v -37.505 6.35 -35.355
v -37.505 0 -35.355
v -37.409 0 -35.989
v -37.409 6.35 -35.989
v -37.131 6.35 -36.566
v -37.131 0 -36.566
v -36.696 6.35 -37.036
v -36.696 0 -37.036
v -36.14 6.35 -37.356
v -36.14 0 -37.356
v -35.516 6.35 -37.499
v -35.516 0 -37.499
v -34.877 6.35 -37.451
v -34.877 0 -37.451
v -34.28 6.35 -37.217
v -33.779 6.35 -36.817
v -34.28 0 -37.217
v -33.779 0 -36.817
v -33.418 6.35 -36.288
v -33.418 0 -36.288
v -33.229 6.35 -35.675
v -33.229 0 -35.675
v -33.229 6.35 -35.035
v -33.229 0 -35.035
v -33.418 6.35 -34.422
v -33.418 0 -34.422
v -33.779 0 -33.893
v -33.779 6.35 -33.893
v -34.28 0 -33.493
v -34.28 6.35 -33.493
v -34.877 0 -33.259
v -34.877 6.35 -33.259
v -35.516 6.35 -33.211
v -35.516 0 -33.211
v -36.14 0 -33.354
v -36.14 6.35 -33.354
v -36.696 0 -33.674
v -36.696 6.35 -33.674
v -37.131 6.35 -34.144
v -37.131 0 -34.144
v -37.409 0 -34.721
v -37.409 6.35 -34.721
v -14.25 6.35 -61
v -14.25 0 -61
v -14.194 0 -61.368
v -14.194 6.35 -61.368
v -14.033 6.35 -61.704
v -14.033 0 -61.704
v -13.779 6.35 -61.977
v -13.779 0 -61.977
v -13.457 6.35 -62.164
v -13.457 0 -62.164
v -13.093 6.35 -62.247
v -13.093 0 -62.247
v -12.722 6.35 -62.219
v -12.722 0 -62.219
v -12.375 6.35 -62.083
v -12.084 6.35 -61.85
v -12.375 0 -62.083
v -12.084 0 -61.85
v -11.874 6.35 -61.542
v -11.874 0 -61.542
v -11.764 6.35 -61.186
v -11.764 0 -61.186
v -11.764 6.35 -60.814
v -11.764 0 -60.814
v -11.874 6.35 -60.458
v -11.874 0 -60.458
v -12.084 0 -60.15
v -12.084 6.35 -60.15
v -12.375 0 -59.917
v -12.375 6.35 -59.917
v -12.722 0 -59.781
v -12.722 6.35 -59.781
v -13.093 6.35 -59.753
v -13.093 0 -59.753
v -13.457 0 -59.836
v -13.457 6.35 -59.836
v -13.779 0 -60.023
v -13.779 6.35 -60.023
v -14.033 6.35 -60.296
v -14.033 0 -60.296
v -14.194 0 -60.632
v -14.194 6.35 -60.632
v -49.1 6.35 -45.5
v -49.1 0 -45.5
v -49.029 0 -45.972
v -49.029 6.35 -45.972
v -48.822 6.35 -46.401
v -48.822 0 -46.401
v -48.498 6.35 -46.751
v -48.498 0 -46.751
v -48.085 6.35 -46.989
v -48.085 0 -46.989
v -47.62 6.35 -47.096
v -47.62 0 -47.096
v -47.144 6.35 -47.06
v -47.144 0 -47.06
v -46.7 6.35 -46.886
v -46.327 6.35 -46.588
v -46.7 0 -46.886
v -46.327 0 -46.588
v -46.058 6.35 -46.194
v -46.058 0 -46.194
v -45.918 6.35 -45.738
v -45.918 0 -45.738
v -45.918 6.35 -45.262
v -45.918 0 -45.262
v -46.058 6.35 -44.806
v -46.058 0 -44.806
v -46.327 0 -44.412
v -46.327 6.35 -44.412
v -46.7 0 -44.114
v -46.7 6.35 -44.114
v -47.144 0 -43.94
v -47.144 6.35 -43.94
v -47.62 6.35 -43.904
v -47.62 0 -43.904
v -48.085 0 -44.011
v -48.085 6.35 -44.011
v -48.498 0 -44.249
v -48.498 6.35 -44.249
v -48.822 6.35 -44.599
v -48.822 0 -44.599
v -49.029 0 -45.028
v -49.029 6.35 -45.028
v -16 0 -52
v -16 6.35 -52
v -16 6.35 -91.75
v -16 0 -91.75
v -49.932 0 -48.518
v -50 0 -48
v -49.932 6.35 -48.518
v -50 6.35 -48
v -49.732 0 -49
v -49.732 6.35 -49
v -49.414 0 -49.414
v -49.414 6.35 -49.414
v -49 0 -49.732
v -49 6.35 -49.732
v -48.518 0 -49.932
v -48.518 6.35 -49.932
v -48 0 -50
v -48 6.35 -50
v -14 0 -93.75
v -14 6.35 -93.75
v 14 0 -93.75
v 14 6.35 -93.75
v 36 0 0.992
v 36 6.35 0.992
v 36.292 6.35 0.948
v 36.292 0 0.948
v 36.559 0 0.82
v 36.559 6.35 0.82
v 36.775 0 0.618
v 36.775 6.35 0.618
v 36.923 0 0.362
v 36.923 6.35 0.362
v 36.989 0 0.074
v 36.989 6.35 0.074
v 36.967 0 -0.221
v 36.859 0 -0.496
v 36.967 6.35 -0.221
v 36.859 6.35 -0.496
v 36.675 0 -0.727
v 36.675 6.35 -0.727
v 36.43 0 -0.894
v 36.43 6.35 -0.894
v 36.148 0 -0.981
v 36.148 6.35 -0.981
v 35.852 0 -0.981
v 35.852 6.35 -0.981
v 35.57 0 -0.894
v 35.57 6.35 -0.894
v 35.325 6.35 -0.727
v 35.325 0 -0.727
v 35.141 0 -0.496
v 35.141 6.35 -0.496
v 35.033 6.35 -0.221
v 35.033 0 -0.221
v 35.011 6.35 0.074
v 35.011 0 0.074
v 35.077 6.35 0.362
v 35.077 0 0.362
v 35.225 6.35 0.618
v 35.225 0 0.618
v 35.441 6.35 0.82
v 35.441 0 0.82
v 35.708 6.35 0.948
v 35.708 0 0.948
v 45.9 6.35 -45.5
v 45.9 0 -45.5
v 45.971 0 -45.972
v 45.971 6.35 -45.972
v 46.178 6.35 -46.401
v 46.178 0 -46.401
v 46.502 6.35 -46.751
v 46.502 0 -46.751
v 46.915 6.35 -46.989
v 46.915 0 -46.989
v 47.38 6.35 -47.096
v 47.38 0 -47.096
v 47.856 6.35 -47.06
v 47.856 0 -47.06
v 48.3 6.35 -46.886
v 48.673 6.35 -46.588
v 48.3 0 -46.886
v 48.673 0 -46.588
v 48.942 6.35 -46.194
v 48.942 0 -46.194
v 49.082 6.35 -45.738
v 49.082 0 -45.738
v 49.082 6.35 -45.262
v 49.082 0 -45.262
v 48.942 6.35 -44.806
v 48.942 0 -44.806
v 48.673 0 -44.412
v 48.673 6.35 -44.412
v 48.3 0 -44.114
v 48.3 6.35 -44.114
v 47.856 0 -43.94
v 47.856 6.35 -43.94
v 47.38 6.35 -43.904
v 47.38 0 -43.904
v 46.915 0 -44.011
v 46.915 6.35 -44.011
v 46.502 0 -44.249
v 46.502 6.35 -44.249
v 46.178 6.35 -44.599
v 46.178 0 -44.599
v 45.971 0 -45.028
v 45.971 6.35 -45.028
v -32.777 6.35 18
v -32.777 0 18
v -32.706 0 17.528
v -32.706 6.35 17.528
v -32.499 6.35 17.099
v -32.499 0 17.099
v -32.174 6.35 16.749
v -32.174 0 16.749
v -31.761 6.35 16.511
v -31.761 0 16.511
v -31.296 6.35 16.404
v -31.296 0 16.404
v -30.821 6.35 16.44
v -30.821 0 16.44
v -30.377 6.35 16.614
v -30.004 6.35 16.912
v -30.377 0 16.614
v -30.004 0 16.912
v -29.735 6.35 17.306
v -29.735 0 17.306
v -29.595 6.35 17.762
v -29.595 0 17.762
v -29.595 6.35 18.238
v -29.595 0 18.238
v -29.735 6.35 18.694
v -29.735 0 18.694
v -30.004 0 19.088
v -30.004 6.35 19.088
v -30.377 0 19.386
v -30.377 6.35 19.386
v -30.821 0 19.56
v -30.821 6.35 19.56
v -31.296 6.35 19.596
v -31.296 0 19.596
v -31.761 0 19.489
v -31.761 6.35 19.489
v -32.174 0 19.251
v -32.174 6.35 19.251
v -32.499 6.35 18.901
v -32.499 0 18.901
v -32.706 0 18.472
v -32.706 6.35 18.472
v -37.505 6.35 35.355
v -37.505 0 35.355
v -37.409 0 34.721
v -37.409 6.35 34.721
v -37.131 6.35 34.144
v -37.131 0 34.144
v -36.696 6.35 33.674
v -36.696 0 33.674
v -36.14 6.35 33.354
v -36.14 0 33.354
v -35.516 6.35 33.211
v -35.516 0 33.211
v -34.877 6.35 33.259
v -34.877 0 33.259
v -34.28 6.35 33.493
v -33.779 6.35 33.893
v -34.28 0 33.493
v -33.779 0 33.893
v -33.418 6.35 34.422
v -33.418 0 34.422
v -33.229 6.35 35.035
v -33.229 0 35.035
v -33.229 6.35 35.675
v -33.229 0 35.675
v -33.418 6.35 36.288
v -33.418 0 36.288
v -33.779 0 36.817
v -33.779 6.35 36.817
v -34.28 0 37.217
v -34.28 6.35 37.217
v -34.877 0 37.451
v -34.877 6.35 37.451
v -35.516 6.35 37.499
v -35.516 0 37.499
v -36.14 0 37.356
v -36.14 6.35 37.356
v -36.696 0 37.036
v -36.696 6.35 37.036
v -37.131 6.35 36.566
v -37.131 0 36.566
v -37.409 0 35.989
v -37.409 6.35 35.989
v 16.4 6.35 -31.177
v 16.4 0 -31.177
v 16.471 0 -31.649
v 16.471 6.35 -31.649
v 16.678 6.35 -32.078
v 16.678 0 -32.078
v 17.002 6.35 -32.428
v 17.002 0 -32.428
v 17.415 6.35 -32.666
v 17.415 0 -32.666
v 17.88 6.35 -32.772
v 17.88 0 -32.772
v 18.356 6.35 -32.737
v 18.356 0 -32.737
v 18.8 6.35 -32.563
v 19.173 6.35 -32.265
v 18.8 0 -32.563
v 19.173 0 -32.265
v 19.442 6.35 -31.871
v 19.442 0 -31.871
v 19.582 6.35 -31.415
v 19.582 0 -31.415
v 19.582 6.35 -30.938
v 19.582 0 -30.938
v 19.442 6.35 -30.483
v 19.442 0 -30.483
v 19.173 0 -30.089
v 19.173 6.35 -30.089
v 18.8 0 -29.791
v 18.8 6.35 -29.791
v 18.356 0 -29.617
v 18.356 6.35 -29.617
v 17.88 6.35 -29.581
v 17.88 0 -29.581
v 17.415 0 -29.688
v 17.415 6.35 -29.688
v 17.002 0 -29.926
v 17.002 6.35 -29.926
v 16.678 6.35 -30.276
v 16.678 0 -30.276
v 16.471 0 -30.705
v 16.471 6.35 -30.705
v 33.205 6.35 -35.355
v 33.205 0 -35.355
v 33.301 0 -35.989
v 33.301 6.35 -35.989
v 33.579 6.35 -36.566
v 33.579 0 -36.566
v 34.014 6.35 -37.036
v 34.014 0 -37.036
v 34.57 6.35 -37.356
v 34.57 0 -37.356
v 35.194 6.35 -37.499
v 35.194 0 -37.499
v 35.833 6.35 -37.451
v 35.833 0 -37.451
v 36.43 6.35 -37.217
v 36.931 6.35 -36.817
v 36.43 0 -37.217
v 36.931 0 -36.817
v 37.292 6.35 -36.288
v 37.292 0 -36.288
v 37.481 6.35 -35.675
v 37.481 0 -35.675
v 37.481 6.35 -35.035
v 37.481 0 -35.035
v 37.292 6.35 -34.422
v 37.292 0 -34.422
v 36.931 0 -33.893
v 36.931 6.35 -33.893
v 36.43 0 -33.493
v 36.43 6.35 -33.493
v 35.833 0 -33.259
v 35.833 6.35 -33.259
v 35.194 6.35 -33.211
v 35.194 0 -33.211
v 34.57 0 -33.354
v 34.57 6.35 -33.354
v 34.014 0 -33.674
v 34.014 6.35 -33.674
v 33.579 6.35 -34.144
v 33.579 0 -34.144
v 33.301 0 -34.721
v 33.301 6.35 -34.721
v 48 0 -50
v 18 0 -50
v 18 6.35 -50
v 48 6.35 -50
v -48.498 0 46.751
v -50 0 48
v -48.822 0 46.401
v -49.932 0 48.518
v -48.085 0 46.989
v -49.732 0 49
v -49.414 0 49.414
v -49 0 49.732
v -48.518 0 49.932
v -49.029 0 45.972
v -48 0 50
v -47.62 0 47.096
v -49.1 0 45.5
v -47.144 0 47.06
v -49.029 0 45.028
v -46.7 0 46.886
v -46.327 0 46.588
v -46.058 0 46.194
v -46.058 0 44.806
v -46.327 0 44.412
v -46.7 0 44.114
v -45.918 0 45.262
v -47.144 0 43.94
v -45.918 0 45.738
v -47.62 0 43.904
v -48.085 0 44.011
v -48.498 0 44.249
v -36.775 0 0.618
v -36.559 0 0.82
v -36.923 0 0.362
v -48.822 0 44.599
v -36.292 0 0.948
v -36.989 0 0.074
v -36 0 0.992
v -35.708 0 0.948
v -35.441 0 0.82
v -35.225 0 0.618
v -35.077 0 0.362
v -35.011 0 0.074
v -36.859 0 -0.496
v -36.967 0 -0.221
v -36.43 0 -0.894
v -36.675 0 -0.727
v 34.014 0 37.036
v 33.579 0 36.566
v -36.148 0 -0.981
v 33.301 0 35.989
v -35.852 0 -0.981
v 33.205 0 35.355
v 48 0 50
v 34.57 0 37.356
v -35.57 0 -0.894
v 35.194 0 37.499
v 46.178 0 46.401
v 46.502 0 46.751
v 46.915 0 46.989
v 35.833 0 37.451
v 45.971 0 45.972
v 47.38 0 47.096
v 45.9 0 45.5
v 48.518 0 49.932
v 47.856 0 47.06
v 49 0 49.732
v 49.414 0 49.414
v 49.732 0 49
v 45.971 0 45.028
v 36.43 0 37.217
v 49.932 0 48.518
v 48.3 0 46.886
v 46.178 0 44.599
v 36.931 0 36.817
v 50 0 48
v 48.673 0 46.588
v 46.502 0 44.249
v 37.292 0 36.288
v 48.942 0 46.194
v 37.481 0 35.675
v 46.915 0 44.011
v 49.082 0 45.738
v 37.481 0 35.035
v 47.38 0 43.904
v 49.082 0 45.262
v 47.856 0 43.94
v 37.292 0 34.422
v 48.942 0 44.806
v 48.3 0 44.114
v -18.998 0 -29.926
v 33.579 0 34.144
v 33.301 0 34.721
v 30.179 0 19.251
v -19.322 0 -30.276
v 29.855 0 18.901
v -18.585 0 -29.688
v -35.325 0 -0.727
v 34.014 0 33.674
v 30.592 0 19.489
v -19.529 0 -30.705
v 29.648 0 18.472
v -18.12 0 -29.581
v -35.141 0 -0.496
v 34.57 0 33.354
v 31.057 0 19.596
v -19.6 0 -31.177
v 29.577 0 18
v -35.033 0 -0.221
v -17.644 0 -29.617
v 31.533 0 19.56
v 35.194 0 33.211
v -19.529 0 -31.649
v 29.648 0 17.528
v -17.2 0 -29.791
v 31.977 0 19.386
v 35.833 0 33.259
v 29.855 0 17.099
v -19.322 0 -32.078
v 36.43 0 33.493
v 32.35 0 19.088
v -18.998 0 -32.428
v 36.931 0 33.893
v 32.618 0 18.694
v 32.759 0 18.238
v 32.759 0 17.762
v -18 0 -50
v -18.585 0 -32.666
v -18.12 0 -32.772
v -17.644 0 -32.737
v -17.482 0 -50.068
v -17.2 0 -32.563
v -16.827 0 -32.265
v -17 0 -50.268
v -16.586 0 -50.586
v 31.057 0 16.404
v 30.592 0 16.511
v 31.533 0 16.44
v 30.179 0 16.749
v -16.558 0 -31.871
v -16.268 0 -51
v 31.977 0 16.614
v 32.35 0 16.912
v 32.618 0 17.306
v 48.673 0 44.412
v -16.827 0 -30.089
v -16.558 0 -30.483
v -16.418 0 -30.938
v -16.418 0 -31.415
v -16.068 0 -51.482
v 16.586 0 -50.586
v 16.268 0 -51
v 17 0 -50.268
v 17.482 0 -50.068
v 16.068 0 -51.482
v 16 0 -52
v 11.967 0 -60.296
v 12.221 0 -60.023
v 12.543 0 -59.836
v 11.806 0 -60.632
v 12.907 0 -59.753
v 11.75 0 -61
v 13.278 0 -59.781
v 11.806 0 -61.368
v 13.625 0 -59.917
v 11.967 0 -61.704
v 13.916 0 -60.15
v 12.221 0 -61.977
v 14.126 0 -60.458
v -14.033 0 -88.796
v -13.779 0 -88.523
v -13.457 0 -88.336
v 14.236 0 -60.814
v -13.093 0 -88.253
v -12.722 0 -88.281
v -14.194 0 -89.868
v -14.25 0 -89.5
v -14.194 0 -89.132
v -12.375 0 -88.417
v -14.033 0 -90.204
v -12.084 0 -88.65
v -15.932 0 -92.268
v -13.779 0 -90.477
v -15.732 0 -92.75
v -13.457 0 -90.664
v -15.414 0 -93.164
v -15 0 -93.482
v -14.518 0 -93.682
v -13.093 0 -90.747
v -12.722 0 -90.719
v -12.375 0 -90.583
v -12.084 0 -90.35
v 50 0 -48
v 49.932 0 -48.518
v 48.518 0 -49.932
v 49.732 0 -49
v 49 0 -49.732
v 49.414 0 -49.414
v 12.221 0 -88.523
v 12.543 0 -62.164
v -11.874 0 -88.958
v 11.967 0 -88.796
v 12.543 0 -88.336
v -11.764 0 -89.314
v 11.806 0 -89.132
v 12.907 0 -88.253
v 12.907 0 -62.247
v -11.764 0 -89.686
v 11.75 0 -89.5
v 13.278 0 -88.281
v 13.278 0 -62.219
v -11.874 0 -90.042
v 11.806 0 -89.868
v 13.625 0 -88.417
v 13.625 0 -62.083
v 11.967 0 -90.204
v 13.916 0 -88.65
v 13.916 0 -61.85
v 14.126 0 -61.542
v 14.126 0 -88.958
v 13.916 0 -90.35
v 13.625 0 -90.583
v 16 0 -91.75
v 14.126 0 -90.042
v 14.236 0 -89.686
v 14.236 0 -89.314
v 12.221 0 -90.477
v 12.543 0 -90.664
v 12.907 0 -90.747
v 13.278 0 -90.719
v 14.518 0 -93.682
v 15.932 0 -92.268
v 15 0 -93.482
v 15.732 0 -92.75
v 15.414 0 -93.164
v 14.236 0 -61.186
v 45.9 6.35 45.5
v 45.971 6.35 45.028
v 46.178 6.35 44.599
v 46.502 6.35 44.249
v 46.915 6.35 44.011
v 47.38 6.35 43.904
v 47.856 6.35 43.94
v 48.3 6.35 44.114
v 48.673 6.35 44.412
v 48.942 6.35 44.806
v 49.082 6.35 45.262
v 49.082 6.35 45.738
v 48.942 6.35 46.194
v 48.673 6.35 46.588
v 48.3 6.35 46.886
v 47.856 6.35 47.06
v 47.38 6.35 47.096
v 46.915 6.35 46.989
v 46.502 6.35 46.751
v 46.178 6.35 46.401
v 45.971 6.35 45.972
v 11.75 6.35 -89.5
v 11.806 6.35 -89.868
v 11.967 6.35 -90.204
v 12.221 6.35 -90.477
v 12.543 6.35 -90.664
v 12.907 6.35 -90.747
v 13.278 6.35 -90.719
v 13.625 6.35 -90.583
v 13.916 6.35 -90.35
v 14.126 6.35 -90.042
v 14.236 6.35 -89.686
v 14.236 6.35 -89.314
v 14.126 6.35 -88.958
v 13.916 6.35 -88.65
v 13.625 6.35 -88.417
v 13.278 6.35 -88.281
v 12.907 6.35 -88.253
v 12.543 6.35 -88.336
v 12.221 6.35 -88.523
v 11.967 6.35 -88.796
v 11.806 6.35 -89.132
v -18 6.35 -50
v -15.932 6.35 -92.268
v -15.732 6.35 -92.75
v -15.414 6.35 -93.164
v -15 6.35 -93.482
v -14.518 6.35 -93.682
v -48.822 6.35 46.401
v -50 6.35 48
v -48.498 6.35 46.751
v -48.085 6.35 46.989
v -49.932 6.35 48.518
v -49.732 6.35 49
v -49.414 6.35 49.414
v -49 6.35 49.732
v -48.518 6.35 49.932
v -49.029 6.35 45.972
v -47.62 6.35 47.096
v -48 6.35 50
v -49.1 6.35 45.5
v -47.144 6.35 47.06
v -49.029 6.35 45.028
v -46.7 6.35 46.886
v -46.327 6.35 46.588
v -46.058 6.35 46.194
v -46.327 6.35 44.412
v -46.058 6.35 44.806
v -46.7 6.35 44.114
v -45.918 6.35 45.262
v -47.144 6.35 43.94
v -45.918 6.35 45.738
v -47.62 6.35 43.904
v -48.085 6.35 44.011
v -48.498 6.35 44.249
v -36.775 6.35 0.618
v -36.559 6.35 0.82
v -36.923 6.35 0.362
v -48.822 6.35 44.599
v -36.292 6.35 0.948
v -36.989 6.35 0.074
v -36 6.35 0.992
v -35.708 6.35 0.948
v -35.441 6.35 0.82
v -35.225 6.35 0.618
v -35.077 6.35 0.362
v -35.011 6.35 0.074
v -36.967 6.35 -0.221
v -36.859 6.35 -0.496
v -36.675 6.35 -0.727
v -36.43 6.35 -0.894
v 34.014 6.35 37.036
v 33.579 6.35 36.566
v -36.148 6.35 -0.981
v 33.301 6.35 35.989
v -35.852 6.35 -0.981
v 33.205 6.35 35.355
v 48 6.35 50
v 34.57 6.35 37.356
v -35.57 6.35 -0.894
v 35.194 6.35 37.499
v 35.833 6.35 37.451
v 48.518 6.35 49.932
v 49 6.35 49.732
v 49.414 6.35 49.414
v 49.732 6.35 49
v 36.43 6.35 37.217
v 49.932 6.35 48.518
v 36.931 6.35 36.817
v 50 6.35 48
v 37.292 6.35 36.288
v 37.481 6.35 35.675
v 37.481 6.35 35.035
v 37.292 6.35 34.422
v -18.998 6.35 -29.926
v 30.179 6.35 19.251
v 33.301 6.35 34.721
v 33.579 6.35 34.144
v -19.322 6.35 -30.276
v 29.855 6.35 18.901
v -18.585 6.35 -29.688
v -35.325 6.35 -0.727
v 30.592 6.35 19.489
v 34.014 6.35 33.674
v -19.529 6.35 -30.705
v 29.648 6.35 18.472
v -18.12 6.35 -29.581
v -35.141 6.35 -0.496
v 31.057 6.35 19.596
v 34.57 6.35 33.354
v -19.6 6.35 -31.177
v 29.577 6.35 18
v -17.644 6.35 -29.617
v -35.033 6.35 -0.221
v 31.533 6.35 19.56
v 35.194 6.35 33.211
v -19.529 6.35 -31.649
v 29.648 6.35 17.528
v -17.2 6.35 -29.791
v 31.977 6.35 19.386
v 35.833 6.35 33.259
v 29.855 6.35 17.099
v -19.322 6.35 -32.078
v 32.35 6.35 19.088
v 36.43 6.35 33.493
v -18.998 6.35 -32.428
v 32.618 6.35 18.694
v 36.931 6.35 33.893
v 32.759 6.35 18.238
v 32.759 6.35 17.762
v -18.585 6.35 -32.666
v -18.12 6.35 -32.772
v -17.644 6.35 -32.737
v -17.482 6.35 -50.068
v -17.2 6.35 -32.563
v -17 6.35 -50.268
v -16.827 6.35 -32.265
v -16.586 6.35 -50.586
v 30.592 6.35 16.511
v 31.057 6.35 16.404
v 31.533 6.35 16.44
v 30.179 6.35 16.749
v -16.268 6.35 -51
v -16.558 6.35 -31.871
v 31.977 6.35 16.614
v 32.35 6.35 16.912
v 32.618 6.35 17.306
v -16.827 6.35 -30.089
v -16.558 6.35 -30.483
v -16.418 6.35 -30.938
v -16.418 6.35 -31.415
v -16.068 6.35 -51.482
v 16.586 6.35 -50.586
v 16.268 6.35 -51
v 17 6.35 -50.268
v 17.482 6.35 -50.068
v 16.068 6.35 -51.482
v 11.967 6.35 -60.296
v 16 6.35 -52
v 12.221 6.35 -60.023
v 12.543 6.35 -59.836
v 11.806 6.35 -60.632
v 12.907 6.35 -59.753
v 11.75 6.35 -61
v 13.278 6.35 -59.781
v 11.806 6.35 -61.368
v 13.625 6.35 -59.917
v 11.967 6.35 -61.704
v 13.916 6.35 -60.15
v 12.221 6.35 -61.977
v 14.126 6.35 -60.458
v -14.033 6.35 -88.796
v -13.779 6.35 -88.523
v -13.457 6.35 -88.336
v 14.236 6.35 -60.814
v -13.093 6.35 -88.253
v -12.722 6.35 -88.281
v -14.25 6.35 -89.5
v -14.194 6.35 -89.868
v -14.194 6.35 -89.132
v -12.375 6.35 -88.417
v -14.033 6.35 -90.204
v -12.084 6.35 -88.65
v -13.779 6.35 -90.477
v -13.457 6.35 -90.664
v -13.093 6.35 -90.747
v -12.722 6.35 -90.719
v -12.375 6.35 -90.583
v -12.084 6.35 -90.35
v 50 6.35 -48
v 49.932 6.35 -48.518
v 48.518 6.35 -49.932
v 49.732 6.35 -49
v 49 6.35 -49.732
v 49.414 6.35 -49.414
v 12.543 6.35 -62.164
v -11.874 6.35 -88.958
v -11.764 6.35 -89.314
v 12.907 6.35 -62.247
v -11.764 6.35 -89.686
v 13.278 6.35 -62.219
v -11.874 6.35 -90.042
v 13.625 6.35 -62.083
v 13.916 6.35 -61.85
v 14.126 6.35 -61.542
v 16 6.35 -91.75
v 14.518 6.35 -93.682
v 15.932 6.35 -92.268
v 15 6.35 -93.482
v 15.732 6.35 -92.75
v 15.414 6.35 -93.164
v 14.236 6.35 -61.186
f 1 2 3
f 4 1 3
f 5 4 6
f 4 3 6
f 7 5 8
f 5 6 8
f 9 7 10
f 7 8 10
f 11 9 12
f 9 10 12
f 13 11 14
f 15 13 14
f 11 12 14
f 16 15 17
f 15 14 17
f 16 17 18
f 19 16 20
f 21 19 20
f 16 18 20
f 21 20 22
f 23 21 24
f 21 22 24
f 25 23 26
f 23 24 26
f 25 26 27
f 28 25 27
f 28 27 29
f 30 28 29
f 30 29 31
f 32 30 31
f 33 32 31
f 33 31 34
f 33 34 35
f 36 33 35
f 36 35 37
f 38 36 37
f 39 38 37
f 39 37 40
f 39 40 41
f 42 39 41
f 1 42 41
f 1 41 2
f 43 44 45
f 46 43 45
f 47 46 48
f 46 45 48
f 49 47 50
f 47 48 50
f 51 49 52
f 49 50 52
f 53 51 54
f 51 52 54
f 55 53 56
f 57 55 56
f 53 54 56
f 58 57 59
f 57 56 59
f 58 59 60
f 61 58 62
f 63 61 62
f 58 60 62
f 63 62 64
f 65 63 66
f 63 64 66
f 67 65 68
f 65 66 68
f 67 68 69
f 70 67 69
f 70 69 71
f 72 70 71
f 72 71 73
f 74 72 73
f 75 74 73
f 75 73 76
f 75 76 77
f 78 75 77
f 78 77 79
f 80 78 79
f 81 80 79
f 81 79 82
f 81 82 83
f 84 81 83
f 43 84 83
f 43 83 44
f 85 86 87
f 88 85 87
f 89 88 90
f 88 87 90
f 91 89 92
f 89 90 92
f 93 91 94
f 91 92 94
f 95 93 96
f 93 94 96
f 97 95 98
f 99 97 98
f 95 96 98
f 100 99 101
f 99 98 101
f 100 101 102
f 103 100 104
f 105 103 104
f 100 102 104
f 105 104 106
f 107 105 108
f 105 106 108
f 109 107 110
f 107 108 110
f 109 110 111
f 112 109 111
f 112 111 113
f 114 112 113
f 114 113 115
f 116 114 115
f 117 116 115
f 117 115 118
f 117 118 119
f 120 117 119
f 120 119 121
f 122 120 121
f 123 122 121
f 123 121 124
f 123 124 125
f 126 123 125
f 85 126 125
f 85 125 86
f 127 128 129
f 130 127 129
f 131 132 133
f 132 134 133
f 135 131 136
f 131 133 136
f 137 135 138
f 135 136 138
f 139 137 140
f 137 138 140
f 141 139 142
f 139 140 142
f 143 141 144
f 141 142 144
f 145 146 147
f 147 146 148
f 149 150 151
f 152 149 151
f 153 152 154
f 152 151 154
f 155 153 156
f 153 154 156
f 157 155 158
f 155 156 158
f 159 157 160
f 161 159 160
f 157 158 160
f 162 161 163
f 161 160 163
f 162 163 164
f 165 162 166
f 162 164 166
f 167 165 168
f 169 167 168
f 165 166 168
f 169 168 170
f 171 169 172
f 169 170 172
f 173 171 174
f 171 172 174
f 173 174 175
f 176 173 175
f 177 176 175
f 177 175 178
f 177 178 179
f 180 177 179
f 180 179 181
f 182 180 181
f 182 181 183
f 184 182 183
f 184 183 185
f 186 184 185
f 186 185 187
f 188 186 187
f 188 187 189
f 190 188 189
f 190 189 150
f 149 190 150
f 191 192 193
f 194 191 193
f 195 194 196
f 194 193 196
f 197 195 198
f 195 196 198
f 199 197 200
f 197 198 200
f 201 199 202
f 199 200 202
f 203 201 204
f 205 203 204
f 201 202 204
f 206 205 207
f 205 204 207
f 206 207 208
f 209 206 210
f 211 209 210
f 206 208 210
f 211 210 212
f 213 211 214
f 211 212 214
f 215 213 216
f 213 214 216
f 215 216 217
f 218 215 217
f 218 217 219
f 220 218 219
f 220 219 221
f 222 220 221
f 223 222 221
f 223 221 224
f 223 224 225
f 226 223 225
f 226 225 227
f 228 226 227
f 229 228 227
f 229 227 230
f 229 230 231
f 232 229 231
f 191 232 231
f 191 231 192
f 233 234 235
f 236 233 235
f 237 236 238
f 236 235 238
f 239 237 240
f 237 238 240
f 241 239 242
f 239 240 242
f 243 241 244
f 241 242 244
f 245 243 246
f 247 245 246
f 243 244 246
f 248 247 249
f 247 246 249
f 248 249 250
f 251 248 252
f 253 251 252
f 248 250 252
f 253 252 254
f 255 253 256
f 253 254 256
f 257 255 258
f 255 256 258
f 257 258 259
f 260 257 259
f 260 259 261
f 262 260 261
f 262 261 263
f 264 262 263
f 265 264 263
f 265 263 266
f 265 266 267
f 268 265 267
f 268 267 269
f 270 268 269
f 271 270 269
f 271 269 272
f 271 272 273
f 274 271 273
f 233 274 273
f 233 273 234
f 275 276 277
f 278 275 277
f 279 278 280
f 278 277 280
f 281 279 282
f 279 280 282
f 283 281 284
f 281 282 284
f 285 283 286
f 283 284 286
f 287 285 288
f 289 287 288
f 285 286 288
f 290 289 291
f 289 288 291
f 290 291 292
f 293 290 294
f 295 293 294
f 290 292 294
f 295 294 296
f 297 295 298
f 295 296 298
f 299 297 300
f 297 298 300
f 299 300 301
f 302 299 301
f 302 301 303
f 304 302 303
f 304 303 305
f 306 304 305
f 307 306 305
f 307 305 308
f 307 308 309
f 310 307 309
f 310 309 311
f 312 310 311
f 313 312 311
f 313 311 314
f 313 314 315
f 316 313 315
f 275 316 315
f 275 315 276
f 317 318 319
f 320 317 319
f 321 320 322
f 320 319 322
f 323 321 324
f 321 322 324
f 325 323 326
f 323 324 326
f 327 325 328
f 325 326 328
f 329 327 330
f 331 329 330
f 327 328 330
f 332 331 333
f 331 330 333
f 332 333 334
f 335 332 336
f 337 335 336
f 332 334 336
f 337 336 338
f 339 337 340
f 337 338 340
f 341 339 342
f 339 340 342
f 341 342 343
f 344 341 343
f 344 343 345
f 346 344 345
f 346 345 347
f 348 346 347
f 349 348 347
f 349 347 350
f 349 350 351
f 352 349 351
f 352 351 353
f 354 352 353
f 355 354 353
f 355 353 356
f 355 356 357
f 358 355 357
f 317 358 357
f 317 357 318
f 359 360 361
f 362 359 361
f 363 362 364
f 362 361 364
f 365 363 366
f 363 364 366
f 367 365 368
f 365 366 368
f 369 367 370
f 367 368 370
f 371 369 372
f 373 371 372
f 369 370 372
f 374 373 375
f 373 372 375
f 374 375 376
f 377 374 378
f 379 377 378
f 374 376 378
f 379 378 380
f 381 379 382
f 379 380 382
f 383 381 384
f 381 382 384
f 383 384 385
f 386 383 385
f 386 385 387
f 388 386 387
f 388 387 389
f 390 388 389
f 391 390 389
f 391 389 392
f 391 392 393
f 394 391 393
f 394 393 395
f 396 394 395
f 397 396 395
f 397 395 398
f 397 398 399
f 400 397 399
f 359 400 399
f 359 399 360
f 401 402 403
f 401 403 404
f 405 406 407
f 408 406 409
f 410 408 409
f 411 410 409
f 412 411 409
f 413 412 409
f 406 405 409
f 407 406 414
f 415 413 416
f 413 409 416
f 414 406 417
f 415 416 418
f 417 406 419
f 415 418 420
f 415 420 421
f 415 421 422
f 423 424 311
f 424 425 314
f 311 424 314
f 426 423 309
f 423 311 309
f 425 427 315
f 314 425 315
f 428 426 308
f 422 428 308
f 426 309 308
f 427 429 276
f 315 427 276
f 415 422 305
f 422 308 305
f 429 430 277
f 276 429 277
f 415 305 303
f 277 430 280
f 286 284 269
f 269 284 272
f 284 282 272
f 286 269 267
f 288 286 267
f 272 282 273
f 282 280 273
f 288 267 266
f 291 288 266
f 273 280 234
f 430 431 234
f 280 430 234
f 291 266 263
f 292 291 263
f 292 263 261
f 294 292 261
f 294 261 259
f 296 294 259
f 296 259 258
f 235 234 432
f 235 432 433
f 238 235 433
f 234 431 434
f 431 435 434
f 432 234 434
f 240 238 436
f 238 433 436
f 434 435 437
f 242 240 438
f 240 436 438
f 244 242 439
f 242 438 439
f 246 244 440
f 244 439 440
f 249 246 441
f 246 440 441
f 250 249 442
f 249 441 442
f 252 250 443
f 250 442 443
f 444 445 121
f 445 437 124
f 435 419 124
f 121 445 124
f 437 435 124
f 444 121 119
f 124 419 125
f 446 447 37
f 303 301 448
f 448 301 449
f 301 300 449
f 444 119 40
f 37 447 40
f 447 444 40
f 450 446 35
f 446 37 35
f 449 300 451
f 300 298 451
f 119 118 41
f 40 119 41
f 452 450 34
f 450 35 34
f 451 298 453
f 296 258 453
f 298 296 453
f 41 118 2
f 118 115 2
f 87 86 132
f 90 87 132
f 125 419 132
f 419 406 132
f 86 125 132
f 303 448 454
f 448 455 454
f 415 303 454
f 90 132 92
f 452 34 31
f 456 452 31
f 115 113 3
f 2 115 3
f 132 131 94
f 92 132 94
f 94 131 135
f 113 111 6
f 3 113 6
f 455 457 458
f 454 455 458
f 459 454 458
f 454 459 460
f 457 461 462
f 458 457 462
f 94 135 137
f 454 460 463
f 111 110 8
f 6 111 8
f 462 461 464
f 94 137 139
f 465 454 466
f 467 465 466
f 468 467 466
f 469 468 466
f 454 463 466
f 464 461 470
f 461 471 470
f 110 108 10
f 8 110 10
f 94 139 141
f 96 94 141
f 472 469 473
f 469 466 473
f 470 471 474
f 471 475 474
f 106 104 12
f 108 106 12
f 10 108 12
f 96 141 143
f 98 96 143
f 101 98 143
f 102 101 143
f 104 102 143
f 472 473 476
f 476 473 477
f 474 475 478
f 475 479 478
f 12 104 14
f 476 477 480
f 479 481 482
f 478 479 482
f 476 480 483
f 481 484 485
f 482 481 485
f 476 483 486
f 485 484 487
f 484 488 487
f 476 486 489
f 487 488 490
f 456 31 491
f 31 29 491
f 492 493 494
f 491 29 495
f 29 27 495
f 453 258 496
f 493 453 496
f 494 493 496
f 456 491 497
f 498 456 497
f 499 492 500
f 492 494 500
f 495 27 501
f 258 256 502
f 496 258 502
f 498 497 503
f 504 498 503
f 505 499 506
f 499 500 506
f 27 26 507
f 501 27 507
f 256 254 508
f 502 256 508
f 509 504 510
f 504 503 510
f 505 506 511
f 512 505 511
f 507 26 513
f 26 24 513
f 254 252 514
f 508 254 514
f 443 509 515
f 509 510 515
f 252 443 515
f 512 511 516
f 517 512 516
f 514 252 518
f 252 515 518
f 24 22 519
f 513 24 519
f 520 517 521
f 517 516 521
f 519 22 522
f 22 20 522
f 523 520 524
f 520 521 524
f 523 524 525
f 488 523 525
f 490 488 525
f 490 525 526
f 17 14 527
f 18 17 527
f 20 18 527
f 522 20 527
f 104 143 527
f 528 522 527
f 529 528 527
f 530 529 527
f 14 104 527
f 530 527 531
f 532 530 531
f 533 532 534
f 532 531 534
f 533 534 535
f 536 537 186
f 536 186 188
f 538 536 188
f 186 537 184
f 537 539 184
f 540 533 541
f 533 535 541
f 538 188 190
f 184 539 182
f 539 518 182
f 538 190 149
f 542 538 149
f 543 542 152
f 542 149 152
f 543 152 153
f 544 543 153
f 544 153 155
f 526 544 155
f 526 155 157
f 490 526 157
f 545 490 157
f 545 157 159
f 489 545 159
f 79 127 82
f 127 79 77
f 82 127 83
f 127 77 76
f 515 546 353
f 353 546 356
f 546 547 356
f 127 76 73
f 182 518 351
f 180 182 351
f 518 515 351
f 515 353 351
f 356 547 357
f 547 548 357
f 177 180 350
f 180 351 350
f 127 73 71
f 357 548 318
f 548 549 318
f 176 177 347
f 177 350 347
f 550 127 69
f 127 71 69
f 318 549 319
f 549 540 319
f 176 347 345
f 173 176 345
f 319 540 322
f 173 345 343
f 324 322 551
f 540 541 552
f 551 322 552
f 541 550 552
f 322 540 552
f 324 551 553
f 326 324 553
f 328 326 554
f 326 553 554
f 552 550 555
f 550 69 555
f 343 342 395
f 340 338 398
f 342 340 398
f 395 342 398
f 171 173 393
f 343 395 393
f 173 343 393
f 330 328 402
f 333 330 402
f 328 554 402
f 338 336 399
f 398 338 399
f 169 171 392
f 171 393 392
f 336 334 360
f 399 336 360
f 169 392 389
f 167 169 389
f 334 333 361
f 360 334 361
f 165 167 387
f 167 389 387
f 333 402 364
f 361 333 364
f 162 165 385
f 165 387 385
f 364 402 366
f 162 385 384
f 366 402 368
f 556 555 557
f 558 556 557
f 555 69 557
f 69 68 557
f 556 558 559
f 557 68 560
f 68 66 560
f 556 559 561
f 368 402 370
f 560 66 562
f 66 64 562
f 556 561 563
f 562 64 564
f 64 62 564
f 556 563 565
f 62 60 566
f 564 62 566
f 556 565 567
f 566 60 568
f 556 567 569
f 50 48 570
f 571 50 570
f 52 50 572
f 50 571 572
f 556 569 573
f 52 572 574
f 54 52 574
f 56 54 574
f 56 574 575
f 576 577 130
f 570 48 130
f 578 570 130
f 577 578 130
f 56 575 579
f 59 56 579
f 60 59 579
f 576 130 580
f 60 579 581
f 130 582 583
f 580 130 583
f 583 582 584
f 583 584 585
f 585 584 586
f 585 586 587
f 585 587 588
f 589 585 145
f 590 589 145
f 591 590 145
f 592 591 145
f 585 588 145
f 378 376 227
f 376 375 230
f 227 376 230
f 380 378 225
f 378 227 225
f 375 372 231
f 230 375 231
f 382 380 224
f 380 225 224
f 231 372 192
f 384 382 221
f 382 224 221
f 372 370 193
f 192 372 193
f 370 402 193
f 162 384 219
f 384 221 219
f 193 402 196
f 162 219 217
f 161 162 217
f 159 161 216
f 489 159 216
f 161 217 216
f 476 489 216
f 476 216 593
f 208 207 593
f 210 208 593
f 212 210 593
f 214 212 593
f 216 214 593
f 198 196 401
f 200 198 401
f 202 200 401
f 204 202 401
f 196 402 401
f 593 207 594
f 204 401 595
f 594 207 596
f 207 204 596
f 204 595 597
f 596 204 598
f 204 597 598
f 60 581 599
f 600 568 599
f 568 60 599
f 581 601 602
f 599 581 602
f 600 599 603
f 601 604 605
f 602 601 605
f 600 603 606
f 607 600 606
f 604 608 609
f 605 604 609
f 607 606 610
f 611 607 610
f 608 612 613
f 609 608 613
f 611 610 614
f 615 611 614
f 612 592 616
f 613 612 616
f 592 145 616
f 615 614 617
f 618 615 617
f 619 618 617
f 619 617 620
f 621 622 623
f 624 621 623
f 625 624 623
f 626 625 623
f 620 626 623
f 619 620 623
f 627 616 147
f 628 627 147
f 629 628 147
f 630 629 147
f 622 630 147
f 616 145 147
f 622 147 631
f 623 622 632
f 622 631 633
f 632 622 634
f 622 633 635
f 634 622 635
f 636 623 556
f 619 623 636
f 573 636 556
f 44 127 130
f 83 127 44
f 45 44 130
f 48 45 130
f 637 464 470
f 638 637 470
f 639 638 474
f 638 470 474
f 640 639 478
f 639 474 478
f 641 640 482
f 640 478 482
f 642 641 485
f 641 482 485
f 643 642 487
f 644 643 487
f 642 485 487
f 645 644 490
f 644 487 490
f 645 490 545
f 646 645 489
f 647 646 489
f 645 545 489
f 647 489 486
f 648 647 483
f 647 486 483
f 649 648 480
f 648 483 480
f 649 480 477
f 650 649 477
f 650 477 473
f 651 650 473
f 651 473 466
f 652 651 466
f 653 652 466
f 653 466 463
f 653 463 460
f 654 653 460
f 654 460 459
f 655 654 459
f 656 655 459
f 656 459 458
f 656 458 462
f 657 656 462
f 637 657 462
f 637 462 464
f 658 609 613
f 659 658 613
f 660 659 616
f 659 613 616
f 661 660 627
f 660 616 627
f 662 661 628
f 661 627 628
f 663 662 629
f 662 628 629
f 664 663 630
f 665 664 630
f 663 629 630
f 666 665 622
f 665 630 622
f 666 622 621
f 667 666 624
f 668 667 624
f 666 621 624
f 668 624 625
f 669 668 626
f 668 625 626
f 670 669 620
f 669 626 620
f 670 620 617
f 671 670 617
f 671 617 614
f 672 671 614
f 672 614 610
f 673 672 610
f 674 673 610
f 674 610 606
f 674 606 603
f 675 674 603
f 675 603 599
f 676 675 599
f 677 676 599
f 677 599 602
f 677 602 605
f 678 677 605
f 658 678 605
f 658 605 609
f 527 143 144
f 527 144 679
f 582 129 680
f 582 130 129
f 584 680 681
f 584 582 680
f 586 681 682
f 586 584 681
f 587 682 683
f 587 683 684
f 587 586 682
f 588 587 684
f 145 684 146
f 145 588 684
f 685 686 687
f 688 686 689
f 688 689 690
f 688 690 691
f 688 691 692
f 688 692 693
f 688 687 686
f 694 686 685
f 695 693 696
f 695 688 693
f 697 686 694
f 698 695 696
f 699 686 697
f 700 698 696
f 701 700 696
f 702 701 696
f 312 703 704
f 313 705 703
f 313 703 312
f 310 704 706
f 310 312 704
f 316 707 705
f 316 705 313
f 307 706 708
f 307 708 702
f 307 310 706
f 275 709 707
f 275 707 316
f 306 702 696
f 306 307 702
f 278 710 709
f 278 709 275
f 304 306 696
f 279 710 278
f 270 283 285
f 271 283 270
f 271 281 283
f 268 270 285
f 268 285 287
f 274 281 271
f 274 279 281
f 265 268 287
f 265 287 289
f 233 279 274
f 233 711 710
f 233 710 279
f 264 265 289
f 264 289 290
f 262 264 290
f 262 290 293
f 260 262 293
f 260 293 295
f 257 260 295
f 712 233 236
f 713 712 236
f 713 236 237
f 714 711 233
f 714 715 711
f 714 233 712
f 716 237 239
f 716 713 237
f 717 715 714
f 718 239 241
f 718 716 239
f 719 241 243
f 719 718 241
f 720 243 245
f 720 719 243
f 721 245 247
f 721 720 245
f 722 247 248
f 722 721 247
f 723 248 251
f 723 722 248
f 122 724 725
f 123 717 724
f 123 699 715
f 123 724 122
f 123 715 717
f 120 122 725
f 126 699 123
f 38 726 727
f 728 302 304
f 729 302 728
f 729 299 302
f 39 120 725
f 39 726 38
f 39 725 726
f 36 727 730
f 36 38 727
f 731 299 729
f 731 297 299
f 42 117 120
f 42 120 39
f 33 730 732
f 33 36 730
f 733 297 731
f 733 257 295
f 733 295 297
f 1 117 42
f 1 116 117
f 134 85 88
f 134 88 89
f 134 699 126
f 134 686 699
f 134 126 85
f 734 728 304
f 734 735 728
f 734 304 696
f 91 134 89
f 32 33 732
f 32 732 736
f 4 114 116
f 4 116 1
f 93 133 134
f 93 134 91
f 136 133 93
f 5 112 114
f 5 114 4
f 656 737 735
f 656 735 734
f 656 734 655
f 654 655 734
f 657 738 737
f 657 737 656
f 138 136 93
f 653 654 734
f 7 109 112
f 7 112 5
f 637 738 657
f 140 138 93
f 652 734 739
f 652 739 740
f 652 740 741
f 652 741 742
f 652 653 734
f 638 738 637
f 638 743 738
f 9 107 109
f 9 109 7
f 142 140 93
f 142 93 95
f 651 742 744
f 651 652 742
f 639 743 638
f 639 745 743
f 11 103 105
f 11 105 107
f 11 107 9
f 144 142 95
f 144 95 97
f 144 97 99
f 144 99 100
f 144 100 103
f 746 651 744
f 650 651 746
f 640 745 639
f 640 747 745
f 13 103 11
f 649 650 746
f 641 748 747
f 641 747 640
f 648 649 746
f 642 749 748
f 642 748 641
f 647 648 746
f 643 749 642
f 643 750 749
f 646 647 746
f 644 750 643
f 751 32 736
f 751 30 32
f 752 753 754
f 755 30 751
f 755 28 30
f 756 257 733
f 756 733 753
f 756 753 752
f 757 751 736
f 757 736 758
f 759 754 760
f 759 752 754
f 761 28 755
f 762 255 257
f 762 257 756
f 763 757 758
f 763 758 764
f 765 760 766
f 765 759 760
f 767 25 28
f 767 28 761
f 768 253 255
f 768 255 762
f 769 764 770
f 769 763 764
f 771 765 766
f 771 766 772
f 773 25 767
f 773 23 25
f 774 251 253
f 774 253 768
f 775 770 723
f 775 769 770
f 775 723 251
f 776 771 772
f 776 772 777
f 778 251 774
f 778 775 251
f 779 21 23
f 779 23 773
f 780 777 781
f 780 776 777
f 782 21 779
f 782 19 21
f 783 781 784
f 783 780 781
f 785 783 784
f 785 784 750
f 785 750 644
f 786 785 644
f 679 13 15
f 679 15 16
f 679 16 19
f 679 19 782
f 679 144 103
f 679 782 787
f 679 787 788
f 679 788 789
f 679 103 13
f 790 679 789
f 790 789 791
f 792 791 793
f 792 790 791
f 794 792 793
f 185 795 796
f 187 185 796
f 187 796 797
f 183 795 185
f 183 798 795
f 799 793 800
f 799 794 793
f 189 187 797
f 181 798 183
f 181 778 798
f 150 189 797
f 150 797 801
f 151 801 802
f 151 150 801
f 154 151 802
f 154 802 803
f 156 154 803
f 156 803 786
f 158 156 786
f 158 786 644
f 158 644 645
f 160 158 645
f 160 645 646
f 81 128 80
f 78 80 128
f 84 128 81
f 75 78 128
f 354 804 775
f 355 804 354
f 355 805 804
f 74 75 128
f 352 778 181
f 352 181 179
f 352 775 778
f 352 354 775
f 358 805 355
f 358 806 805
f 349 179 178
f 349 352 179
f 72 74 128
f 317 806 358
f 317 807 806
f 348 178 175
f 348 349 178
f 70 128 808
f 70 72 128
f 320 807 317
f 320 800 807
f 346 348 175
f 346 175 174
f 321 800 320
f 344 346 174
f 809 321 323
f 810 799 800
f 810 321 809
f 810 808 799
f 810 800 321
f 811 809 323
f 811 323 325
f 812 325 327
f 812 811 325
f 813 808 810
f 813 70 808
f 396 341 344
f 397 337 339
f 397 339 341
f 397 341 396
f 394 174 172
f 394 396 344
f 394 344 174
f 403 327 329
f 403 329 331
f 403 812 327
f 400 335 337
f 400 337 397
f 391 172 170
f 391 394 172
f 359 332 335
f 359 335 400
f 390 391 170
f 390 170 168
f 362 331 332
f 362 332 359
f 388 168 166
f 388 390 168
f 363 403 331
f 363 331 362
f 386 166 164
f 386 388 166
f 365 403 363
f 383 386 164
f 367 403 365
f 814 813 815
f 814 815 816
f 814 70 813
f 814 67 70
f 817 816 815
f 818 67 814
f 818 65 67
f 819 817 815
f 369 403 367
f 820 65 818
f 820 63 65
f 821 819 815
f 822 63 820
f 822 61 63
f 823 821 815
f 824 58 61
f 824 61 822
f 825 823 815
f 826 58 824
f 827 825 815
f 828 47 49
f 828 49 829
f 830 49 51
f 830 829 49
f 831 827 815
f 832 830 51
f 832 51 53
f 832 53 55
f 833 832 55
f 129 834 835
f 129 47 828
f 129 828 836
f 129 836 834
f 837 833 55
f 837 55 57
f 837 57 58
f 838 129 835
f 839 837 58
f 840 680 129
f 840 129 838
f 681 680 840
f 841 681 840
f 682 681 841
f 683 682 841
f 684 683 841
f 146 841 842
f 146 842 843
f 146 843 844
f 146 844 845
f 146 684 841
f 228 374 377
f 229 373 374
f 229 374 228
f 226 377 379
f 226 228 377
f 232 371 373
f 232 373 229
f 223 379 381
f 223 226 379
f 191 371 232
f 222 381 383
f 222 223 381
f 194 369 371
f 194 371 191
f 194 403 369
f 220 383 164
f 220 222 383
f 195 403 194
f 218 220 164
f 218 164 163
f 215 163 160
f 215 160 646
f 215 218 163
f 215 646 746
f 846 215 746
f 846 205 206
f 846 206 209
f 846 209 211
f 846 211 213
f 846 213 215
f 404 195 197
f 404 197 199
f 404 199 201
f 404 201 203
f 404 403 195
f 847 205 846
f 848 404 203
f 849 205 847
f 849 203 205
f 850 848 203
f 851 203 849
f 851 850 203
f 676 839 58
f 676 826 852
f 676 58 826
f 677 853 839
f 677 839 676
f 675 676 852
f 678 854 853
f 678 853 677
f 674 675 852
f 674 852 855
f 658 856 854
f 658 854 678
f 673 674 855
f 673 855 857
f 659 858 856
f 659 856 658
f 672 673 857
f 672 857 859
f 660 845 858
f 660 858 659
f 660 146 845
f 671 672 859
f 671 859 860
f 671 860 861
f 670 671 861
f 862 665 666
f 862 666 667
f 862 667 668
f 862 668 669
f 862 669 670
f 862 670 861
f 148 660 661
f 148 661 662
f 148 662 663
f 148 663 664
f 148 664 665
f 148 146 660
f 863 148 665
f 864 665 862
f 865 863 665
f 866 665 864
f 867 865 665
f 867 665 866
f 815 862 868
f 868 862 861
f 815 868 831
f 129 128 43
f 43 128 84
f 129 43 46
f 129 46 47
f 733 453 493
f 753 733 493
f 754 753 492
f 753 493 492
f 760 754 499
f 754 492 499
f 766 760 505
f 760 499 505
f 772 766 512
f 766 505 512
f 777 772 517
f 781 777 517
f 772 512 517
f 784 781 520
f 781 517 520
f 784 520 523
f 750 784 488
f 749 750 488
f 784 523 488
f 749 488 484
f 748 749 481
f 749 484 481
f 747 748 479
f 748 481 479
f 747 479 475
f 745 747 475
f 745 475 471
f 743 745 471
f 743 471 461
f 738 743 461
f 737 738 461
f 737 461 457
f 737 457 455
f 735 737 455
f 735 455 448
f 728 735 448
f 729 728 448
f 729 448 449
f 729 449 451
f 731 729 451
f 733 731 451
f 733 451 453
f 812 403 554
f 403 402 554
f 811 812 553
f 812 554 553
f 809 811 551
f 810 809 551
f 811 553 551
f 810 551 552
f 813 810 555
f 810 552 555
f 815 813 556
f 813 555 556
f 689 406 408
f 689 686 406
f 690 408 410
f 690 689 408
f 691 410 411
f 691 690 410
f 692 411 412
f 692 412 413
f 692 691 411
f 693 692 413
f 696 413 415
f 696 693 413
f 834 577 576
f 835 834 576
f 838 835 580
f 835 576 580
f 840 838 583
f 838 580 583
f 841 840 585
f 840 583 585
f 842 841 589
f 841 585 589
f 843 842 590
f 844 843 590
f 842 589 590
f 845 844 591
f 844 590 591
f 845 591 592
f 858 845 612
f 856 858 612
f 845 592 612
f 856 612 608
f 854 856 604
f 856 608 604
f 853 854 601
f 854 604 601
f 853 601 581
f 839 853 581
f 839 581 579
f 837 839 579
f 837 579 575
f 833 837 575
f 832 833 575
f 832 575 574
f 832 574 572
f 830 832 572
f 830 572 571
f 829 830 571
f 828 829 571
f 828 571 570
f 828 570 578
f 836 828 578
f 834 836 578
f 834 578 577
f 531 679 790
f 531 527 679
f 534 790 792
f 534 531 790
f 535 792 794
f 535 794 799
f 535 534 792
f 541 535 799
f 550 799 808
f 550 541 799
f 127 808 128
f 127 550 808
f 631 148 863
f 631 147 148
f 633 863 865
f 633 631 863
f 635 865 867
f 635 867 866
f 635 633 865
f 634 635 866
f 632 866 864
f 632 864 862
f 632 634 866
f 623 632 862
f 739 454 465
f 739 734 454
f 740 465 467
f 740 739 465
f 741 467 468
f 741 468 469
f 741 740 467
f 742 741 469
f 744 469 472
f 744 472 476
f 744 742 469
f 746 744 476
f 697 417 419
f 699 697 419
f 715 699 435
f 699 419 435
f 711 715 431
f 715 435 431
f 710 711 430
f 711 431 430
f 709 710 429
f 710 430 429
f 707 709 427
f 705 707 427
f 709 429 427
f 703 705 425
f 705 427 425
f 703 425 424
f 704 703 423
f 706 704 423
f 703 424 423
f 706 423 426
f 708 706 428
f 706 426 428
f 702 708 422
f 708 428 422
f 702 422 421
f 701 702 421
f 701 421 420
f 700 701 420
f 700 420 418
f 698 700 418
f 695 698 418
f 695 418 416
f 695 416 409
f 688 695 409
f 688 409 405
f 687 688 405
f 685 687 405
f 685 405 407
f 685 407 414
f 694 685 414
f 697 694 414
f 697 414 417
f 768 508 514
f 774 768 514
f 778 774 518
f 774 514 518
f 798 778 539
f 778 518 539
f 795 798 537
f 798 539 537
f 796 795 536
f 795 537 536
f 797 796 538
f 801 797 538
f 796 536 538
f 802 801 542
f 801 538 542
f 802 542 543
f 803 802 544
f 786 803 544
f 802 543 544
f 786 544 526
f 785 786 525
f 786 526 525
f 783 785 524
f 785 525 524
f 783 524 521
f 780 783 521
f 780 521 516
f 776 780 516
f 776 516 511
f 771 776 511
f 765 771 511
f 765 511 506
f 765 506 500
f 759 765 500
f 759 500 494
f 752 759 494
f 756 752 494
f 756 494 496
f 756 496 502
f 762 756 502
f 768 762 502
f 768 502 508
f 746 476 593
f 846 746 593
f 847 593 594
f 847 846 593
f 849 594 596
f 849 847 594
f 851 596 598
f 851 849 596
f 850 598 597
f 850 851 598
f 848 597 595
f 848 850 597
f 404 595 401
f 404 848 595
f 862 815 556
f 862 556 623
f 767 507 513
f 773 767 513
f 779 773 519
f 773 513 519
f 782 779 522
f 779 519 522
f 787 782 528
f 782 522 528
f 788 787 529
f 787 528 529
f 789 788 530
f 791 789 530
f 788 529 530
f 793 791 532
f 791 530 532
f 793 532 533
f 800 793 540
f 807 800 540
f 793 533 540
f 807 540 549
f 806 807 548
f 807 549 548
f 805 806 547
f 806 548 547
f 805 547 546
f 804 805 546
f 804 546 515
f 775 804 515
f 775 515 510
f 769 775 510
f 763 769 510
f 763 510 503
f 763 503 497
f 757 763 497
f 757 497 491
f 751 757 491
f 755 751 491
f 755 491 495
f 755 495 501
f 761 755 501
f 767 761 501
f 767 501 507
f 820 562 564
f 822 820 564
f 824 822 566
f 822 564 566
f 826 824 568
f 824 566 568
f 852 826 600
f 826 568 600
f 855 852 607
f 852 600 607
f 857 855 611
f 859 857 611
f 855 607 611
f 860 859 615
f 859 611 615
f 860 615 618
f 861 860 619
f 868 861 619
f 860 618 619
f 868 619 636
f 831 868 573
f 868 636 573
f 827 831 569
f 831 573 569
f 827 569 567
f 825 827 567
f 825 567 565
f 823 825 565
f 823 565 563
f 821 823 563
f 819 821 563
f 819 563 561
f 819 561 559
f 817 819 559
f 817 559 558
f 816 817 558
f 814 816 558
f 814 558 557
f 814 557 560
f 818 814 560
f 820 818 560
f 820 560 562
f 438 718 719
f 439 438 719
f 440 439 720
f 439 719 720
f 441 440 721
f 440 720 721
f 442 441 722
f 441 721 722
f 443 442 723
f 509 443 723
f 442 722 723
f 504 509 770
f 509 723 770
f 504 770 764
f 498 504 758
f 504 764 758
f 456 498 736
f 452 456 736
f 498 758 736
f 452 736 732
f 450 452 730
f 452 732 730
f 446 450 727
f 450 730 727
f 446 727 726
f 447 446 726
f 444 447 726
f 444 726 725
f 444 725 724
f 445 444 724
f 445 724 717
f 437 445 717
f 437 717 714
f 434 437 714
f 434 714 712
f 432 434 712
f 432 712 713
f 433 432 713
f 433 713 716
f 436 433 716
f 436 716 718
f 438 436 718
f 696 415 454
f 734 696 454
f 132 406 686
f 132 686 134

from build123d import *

# Parameters (mm, degrees)
SKETCH1_W             = 100
SKETCH1_H             = 100
BOSS_EXTRUDE1_DEPTH   = 6.35
SKETCH10_W            = 32
SKETCH10_H            = 43.75
BOSS_EXTRUDE2_DEPTH   = 6.35
SKETCH3_R             = 0.99187
CUT_EXTRUDE1_DEPTH    = 107.439583802
M3_CLEARANCE_HOLE1_D  = 3.2
M4_CLEARANCE_HOLE1_D  = 4.3
M3X0_5_TAPPED_HOLE1_D = 2.5
FILLET1_R             = 2


with BuildPart() as part:
    # Sketch1 → Boss-Extrude1 (new body)
    with BuildSketch(Plane(origin=(0, 0, 0), x_dir=(1, 0, 0), z_dir=(0, 1, 0))):
        Rectangle(SKETCH1_W, SKETCH1_H)
    extrude(amount=BOSS_EXTRUDE1_DEPTH)

    # Sketch10 → Boss-Extrude2 (add)
    with BuildSketch(Plane(origin=(0, 6.35, 0), x_dir=(1, 0, 0), z_dir=(0, 1, 0))):
        with Locations((0, 71.875)):
            Rectangle(SKETCH10_W, SKETCH10_H)
    extrude(amount=-BOSS_EXTRUDE2_DEPTH)

    # Sketch3 → Cut-Extrude1 (cut, through all)
    with BuildSketch(Plane(origin=(0, 6.35, 0), x_dir=(1, 0, 0), z_dir=(0, 1, 0))):
        with Locations(Location((-36, 0, 0), (0, 0, 270))):
            Circle(SKETCH3_R)
        with Locations(Location((36, 0, 0), (0, 0, 270))):
            Circle(SKETCH3_R)
    extrude(amount=-CUT_EXTRUDE1_DEPTH, mode=Mode.SUBTRACT)

    # M3 Clearance Hole1 (through all)
    with Locations(Plane(origin=(0, 6.35, 0), x_dir=(1, 0, 0), z_dir=(0, 1, 0))):
        with Locations((-47.5, 45.5), (47.5, 45.5), (47.5, -45.5), (-47.5, -45.5), (-31.176914536, -18), (31.176914536, -18), (18, 31.176914536), (-18, 31.176914536)):
            Hole(M3_CLEARANCE_HOLE1_D / 2)

    # M4 Clearance Hole1 (through all)
    with Locations(Plane(origin=(0, 6.35, 0), x_dir=(1, 0, 0), z_dir=(0, 1, 0))):
        with Locations((-35.355, -35.355), (-35.355, 35.355), (35.355, 35.355), (35.355, -35.355)):
            Hole(M4_CLEARANCE_HOLE1_D / 2)

    # M3x0.5 Tapped Hole1 (through all)
    with Locations(Plane(origin=(0, 6.35, 0), x_dir=(1, 0, 0), z_dir=(0, 1, 0))):
        with Locations((-13, 89.5), (13, 89.5), (13, 61), (-13, 61)):
            Hole(M3X0_5_TAPPED_HOLE1_D / 2)

    # Fillet1
    fillet1_edges = [part.edges().sort_by_distance(p)[0] for p in [
        (16, 3.175, -93.75),
        (-16, 3.175, -93.75),
        (-16, 3.175, -50),
        (16, 3.175, -50),
        (50, 3.175, 50),
        (-50, 3.175, 50),
        (-50, 3.175, -50),
        (50, 3.175, -50),
    ]]
    fillet(fillet1_edges, radius=FILLET1_R)


solid = part.part
